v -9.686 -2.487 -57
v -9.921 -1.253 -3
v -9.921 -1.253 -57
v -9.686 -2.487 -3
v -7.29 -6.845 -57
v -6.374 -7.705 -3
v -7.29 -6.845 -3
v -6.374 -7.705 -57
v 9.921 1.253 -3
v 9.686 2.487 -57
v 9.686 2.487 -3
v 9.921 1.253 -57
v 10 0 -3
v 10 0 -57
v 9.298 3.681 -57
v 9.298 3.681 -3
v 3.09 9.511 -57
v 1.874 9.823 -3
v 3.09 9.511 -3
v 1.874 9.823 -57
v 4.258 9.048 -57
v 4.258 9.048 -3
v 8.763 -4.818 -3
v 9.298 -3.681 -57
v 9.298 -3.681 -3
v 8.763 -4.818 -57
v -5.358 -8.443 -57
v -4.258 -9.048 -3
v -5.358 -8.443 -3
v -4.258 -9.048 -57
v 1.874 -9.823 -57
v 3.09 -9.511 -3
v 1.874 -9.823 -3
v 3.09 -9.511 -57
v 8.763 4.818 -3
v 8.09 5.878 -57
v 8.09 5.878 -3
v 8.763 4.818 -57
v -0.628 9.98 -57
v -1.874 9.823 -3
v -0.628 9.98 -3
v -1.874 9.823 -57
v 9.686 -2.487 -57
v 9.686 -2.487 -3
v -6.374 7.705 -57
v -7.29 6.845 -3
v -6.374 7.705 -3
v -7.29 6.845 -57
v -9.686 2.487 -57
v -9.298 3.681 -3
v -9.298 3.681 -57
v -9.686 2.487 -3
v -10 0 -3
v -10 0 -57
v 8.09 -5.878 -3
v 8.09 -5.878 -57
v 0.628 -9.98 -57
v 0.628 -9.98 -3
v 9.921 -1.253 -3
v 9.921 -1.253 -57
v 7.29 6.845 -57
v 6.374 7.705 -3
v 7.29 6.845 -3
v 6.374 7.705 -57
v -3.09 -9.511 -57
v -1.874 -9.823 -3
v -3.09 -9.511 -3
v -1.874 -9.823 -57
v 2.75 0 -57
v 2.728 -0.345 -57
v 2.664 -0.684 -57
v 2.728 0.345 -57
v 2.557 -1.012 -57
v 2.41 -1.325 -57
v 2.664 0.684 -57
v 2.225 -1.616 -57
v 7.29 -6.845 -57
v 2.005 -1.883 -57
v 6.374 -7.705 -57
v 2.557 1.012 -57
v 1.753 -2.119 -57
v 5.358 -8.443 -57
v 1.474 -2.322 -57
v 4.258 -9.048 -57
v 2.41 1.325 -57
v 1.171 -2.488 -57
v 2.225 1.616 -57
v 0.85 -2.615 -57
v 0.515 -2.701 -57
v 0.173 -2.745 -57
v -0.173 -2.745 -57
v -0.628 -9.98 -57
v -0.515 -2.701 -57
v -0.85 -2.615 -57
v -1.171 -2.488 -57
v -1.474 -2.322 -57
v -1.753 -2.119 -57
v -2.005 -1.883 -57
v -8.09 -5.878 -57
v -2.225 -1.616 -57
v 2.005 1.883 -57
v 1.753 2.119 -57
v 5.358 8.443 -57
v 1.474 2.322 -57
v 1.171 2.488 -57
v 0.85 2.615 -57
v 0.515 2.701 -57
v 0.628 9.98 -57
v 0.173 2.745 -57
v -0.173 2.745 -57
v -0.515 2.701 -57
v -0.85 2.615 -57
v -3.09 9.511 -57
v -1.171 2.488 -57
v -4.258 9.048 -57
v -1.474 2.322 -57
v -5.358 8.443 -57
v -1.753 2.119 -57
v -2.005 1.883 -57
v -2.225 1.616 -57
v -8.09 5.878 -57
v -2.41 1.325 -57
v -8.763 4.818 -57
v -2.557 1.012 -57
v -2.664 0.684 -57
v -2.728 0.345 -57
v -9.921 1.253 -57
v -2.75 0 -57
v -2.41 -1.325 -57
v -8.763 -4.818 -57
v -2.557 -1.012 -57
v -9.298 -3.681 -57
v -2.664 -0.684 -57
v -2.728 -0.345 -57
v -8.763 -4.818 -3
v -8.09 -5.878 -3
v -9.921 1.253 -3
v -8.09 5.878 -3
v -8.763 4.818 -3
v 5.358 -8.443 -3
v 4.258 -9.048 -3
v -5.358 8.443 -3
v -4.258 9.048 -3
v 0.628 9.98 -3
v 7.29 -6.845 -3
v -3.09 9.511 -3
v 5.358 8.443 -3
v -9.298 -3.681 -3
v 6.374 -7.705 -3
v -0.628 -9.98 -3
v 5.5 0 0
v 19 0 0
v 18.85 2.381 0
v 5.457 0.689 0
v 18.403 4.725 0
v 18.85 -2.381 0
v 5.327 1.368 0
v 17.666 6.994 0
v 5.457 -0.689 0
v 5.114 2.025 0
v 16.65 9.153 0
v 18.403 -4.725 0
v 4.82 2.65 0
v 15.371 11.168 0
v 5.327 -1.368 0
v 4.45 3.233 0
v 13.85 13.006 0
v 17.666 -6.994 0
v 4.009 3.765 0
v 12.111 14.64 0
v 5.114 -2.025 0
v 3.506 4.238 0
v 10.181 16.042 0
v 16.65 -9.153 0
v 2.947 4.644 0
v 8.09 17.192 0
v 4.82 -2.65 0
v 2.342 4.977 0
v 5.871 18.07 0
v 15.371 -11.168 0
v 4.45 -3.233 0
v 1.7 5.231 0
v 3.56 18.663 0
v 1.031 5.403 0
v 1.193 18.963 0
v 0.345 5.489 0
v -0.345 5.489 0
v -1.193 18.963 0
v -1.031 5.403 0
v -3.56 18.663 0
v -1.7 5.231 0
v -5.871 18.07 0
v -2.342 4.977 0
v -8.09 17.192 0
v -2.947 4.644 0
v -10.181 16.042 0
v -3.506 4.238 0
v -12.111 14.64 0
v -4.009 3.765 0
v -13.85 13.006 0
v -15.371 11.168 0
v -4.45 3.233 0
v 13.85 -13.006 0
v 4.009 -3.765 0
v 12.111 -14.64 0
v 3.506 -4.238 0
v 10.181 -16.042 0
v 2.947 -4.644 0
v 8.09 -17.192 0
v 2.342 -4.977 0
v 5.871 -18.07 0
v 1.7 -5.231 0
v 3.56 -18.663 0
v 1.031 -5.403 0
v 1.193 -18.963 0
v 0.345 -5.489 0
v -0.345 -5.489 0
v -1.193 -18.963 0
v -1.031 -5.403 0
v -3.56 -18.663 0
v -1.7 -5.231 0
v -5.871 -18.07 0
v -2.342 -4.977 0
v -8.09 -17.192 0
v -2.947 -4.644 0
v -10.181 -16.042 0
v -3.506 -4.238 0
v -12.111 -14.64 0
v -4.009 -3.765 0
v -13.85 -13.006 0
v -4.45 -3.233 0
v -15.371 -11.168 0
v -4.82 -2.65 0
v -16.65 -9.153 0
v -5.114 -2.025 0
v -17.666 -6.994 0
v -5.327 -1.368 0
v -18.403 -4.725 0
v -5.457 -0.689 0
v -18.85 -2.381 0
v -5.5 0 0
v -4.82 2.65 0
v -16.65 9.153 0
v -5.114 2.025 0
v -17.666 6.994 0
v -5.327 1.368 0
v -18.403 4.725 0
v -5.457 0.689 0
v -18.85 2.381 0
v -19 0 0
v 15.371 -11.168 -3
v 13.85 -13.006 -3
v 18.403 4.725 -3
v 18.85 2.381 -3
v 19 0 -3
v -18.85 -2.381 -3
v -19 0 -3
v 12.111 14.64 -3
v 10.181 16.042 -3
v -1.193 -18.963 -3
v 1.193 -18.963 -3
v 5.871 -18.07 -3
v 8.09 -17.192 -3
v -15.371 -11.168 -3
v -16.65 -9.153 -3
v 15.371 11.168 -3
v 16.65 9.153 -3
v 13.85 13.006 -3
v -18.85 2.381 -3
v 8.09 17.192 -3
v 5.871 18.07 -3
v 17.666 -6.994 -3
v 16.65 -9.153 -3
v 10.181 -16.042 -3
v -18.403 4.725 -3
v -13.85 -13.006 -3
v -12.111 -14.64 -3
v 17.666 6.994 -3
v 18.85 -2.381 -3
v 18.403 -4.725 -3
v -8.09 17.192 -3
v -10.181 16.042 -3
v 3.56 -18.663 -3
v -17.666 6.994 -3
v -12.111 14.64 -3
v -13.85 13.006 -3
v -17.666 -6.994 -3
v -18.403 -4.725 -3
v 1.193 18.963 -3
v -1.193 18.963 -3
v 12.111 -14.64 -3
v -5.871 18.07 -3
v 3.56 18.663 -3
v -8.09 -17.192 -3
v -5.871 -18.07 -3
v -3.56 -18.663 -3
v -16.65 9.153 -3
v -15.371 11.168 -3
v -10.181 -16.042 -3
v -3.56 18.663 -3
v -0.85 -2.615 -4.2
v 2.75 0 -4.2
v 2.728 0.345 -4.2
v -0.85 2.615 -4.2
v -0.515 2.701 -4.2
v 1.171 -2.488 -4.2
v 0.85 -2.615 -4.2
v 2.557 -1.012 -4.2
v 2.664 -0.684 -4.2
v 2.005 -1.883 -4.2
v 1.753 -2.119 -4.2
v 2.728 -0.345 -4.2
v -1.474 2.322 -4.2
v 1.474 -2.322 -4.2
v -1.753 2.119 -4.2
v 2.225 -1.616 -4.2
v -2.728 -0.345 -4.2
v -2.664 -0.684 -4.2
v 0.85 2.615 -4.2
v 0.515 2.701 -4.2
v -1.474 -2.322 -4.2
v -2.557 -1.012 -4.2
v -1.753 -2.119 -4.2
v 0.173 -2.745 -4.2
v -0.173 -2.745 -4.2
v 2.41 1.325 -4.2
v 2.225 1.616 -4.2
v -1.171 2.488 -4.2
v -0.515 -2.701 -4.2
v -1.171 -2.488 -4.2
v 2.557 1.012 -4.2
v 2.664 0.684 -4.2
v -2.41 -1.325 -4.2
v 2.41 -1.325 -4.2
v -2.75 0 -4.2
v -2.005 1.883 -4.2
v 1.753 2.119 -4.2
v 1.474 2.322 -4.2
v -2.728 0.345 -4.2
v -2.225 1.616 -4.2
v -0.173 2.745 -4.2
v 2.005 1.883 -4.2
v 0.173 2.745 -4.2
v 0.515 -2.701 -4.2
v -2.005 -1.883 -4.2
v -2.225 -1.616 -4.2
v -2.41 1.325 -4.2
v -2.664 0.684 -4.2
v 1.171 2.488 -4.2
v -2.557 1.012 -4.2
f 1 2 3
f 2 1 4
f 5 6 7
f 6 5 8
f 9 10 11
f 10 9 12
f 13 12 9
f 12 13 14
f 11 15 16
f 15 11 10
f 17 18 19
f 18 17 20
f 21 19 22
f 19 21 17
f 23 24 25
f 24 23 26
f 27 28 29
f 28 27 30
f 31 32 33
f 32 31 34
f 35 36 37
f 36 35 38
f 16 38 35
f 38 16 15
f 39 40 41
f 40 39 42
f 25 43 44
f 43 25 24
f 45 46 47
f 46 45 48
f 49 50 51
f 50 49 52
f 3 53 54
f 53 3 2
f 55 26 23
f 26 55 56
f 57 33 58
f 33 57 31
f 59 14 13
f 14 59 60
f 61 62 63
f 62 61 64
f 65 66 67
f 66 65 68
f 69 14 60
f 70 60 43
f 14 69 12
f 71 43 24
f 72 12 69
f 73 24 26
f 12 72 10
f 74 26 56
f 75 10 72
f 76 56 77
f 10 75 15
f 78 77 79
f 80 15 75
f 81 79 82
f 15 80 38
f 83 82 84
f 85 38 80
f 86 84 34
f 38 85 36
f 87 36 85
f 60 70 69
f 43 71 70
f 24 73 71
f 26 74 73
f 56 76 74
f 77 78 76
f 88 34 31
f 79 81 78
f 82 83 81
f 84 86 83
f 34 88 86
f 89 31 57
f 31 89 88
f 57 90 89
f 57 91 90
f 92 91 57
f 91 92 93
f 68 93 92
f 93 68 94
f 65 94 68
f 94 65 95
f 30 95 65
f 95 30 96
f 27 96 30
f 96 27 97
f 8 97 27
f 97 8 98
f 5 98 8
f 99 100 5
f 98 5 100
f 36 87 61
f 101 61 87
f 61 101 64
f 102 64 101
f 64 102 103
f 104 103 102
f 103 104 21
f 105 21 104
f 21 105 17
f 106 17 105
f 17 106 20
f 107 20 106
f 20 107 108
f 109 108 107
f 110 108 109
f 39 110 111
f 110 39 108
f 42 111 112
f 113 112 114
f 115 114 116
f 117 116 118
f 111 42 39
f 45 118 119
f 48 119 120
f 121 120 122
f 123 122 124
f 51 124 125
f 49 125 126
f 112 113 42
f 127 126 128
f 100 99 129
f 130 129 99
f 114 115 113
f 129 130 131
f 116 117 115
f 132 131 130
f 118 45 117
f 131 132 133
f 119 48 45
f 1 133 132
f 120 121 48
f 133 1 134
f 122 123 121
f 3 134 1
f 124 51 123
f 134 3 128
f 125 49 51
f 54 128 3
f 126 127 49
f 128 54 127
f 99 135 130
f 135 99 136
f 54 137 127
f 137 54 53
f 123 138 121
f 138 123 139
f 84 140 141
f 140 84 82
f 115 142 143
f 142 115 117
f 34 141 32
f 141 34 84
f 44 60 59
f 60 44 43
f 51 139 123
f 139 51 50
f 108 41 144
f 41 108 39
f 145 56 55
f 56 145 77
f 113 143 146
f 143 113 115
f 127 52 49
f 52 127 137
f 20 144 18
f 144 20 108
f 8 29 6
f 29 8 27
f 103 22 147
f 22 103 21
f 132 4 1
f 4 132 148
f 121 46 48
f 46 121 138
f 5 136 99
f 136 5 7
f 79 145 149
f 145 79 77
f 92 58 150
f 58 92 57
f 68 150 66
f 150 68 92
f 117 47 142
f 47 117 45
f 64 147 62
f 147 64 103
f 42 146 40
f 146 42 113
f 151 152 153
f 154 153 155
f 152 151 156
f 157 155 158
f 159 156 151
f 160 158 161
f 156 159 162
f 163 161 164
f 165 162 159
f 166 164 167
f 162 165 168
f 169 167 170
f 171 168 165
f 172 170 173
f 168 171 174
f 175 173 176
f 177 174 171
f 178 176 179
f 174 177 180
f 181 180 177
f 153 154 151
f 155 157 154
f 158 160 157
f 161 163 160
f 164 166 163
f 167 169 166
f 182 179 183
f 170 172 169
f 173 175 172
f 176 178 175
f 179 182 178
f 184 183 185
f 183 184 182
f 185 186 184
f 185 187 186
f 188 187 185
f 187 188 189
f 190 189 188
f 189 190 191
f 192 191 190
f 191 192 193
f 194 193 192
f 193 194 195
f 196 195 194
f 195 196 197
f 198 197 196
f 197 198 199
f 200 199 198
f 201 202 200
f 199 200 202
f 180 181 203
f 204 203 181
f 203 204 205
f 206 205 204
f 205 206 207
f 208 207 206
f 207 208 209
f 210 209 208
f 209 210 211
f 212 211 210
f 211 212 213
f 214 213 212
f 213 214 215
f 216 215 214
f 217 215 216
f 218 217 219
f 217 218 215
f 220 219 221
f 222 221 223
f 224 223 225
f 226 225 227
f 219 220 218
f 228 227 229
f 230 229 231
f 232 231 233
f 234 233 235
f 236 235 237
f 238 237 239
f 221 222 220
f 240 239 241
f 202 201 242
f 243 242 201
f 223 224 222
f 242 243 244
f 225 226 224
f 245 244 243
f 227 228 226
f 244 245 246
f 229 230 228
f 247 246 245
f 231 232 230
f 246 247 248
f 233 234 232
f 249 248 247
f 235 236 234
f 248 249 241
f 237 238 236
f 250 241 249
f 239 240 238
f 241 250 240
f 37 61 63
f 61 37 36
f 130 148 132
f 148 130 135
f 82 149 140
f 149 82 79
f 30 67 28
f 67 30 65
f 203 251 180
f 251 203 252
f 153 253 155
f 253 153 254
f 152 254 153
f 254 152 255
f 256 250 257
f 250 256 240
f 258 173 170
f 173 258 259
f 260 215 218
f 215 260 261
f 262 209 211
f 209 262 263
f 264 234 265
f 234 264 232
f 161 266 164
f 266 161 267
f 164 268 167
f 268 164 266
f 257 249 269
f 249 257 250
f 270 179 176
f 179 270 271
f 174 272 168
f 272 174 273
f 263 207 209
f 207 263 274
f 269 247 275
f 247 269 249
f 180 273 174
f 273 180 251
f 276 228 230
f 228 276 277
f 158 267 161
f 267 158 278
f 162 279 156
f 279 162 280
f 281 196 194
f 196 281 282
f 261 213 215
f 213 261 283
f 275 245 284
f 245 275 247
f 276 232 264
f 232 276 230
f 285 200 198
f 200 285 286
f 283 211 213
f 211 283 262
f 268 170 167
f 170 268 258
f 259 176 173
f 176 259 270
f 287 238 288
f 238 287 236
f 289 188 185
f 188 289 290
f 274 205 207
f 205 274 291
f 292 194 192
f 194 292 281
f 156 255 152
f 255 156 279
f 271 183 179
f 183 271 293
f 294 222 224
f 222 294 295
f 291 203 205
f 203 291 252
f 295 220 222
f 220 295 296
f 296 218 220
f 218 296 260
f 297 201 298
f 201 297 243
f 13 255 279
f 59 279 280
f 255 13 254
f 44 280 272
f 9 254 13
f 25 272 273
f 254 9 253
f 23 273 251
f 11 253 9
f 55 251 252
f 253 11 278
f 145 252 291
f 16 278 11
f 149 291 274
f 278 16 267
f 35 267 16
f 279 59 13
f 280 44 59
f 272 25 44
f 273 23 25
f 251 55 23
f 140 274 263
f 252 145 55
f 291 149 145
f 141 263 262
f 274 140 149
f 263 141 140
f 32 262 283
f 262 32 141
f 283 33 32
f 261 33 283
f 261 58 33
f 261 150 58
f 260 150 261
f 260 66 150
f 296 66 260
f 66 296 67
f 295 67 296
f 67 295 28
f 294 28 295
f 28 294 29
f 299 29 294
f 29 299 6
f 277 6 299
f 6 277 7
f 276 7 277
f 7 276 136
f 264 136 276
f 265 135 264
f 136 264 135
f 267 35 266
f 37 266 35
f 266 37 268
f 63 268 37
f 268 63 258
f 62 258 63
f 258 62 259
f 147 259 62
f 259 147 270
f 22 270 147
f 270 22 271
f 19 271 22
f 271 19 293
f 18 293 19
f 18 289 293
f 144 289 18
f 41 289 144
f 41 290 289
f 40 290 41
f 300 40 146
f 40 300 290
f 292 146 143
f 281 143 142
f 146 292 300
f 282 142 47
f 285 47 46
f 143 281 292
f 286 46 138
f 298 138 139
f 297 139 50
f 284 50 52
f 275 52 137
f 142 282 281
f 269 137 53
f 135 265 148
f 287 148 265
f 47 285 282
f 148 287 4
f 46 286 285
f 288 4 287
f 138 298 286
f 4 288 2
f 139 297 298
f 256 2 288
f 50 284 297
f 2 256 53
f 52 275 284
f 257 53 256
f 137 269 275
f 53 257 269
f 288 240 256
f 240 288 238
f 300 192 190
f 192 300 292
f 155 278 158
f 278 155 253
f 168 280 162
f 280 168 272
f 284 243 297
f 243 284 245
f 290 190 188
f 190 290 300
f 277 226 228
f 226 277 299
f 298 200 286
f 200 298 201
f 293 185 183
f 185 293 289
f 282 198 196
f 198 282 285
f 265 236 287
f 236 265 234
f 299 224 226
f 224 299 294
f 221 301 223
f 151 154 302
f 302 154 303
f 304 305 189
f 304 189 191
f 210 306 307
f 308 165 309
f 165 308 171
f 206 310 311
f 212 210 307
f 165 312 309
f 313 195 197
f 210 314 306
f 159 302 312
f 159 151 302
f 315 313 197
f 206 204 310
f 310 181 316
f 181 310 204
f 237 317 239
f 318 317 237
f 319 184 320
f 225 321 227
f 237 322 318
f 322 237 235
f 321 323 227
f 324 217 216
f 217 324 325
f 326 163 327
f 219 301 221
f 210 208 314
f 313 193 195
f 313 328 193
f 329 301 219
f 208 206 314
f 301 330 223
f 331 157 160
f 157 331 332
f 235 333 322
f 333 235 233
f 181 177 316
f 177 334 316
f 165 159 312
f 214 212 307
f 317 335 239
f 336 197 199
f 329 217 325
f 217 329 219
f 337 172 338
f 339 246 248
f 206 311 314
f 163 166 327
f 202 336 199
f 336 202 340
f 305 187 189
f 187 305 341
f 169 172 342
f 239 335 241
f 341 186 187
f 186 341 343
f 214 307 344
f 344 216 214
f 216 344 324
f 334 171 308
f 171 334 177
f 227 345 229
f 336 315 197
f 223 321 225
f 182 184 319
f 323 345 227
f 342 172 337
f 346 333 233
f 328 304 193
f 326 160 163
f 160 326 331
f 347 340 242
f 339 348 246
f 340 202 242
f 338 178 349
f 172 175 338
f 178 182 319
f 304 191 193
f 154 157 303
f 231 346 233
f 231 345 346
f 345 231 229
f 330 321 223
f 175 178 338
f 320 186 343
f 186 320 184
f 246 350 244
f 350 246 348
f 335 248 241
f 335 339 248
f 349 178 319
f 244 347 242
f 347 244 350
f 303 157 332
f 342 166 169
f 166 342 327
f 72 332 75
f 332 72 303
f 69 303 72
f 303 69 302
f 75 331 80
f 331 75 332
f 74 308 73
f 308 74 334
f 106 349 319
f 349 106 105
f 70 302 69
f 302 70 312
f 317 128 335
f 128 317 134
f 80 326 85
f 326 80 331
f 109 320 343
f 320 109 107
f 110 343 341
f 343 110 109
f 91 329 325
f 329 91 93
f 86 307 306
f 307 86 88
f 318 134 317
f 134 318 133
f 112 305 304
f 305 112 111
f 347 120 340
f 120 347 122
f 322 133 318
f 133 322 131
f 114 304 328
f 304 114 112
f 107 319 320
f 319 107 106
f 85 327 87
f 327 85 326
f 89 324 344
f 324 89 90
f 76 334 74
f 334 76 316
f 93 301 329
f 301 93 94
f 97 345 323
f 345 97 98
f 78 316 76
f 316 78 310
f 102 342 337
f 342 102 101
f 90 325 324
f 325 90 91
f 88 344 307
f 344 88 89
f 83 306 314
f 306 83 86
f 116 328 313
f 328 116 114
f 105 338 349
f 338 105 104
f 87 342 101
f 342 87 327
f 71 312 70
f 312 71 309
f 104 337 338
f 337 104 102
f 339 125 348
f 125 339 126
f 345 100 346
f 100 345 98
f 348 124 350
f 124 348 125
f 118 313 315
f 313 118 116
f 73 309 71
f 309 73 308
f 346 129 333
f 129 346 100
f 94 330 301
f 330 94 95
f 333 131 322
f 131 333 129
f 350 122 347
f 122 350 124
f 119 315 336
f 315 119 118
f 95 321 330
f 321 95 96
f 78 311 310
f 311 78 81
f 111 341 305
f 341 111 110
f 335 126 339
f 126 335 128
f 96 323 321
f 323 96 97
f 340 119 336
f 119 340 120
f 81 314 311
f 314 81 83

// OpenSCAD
$fn = 50;


difference() {
	union() {
		translate(v = [0, 0, -57.0000000000]) {
			cylinder(h = 57, r = 10.0000000000);
		}
		translate(v = [0, 0, -3.0000000000]) {
			cylinder(h = 3, r = 19.0000000000);
		}
	}
	union() {
		translate(v = [0, 0, 0]) {
			rotate(a = [0, 0, 0]) {
				difference() {
					union() {
						#translate(v = [0, 0, -57.0000000000]) {
							cylinder(h = 57, r = 2.2500000000);
						}
						#translate(v = [0, 0, -4.2000000000]) {
							cylinder(h = 4.2000000000, r1 = 2.7500000000, r2 = 5.5000000000);
						}
						#translate(v = [0, 0, -57.0000000000]) {
							cylinder(h = 57, r = 2.7500000000);
						}
						#translate(v = [0, 0, -57.0000000000]) {
							cylinder(h = 57, r = 2.2500000000);
						}
					}
					union();
				}
			}
		}
	}
}
